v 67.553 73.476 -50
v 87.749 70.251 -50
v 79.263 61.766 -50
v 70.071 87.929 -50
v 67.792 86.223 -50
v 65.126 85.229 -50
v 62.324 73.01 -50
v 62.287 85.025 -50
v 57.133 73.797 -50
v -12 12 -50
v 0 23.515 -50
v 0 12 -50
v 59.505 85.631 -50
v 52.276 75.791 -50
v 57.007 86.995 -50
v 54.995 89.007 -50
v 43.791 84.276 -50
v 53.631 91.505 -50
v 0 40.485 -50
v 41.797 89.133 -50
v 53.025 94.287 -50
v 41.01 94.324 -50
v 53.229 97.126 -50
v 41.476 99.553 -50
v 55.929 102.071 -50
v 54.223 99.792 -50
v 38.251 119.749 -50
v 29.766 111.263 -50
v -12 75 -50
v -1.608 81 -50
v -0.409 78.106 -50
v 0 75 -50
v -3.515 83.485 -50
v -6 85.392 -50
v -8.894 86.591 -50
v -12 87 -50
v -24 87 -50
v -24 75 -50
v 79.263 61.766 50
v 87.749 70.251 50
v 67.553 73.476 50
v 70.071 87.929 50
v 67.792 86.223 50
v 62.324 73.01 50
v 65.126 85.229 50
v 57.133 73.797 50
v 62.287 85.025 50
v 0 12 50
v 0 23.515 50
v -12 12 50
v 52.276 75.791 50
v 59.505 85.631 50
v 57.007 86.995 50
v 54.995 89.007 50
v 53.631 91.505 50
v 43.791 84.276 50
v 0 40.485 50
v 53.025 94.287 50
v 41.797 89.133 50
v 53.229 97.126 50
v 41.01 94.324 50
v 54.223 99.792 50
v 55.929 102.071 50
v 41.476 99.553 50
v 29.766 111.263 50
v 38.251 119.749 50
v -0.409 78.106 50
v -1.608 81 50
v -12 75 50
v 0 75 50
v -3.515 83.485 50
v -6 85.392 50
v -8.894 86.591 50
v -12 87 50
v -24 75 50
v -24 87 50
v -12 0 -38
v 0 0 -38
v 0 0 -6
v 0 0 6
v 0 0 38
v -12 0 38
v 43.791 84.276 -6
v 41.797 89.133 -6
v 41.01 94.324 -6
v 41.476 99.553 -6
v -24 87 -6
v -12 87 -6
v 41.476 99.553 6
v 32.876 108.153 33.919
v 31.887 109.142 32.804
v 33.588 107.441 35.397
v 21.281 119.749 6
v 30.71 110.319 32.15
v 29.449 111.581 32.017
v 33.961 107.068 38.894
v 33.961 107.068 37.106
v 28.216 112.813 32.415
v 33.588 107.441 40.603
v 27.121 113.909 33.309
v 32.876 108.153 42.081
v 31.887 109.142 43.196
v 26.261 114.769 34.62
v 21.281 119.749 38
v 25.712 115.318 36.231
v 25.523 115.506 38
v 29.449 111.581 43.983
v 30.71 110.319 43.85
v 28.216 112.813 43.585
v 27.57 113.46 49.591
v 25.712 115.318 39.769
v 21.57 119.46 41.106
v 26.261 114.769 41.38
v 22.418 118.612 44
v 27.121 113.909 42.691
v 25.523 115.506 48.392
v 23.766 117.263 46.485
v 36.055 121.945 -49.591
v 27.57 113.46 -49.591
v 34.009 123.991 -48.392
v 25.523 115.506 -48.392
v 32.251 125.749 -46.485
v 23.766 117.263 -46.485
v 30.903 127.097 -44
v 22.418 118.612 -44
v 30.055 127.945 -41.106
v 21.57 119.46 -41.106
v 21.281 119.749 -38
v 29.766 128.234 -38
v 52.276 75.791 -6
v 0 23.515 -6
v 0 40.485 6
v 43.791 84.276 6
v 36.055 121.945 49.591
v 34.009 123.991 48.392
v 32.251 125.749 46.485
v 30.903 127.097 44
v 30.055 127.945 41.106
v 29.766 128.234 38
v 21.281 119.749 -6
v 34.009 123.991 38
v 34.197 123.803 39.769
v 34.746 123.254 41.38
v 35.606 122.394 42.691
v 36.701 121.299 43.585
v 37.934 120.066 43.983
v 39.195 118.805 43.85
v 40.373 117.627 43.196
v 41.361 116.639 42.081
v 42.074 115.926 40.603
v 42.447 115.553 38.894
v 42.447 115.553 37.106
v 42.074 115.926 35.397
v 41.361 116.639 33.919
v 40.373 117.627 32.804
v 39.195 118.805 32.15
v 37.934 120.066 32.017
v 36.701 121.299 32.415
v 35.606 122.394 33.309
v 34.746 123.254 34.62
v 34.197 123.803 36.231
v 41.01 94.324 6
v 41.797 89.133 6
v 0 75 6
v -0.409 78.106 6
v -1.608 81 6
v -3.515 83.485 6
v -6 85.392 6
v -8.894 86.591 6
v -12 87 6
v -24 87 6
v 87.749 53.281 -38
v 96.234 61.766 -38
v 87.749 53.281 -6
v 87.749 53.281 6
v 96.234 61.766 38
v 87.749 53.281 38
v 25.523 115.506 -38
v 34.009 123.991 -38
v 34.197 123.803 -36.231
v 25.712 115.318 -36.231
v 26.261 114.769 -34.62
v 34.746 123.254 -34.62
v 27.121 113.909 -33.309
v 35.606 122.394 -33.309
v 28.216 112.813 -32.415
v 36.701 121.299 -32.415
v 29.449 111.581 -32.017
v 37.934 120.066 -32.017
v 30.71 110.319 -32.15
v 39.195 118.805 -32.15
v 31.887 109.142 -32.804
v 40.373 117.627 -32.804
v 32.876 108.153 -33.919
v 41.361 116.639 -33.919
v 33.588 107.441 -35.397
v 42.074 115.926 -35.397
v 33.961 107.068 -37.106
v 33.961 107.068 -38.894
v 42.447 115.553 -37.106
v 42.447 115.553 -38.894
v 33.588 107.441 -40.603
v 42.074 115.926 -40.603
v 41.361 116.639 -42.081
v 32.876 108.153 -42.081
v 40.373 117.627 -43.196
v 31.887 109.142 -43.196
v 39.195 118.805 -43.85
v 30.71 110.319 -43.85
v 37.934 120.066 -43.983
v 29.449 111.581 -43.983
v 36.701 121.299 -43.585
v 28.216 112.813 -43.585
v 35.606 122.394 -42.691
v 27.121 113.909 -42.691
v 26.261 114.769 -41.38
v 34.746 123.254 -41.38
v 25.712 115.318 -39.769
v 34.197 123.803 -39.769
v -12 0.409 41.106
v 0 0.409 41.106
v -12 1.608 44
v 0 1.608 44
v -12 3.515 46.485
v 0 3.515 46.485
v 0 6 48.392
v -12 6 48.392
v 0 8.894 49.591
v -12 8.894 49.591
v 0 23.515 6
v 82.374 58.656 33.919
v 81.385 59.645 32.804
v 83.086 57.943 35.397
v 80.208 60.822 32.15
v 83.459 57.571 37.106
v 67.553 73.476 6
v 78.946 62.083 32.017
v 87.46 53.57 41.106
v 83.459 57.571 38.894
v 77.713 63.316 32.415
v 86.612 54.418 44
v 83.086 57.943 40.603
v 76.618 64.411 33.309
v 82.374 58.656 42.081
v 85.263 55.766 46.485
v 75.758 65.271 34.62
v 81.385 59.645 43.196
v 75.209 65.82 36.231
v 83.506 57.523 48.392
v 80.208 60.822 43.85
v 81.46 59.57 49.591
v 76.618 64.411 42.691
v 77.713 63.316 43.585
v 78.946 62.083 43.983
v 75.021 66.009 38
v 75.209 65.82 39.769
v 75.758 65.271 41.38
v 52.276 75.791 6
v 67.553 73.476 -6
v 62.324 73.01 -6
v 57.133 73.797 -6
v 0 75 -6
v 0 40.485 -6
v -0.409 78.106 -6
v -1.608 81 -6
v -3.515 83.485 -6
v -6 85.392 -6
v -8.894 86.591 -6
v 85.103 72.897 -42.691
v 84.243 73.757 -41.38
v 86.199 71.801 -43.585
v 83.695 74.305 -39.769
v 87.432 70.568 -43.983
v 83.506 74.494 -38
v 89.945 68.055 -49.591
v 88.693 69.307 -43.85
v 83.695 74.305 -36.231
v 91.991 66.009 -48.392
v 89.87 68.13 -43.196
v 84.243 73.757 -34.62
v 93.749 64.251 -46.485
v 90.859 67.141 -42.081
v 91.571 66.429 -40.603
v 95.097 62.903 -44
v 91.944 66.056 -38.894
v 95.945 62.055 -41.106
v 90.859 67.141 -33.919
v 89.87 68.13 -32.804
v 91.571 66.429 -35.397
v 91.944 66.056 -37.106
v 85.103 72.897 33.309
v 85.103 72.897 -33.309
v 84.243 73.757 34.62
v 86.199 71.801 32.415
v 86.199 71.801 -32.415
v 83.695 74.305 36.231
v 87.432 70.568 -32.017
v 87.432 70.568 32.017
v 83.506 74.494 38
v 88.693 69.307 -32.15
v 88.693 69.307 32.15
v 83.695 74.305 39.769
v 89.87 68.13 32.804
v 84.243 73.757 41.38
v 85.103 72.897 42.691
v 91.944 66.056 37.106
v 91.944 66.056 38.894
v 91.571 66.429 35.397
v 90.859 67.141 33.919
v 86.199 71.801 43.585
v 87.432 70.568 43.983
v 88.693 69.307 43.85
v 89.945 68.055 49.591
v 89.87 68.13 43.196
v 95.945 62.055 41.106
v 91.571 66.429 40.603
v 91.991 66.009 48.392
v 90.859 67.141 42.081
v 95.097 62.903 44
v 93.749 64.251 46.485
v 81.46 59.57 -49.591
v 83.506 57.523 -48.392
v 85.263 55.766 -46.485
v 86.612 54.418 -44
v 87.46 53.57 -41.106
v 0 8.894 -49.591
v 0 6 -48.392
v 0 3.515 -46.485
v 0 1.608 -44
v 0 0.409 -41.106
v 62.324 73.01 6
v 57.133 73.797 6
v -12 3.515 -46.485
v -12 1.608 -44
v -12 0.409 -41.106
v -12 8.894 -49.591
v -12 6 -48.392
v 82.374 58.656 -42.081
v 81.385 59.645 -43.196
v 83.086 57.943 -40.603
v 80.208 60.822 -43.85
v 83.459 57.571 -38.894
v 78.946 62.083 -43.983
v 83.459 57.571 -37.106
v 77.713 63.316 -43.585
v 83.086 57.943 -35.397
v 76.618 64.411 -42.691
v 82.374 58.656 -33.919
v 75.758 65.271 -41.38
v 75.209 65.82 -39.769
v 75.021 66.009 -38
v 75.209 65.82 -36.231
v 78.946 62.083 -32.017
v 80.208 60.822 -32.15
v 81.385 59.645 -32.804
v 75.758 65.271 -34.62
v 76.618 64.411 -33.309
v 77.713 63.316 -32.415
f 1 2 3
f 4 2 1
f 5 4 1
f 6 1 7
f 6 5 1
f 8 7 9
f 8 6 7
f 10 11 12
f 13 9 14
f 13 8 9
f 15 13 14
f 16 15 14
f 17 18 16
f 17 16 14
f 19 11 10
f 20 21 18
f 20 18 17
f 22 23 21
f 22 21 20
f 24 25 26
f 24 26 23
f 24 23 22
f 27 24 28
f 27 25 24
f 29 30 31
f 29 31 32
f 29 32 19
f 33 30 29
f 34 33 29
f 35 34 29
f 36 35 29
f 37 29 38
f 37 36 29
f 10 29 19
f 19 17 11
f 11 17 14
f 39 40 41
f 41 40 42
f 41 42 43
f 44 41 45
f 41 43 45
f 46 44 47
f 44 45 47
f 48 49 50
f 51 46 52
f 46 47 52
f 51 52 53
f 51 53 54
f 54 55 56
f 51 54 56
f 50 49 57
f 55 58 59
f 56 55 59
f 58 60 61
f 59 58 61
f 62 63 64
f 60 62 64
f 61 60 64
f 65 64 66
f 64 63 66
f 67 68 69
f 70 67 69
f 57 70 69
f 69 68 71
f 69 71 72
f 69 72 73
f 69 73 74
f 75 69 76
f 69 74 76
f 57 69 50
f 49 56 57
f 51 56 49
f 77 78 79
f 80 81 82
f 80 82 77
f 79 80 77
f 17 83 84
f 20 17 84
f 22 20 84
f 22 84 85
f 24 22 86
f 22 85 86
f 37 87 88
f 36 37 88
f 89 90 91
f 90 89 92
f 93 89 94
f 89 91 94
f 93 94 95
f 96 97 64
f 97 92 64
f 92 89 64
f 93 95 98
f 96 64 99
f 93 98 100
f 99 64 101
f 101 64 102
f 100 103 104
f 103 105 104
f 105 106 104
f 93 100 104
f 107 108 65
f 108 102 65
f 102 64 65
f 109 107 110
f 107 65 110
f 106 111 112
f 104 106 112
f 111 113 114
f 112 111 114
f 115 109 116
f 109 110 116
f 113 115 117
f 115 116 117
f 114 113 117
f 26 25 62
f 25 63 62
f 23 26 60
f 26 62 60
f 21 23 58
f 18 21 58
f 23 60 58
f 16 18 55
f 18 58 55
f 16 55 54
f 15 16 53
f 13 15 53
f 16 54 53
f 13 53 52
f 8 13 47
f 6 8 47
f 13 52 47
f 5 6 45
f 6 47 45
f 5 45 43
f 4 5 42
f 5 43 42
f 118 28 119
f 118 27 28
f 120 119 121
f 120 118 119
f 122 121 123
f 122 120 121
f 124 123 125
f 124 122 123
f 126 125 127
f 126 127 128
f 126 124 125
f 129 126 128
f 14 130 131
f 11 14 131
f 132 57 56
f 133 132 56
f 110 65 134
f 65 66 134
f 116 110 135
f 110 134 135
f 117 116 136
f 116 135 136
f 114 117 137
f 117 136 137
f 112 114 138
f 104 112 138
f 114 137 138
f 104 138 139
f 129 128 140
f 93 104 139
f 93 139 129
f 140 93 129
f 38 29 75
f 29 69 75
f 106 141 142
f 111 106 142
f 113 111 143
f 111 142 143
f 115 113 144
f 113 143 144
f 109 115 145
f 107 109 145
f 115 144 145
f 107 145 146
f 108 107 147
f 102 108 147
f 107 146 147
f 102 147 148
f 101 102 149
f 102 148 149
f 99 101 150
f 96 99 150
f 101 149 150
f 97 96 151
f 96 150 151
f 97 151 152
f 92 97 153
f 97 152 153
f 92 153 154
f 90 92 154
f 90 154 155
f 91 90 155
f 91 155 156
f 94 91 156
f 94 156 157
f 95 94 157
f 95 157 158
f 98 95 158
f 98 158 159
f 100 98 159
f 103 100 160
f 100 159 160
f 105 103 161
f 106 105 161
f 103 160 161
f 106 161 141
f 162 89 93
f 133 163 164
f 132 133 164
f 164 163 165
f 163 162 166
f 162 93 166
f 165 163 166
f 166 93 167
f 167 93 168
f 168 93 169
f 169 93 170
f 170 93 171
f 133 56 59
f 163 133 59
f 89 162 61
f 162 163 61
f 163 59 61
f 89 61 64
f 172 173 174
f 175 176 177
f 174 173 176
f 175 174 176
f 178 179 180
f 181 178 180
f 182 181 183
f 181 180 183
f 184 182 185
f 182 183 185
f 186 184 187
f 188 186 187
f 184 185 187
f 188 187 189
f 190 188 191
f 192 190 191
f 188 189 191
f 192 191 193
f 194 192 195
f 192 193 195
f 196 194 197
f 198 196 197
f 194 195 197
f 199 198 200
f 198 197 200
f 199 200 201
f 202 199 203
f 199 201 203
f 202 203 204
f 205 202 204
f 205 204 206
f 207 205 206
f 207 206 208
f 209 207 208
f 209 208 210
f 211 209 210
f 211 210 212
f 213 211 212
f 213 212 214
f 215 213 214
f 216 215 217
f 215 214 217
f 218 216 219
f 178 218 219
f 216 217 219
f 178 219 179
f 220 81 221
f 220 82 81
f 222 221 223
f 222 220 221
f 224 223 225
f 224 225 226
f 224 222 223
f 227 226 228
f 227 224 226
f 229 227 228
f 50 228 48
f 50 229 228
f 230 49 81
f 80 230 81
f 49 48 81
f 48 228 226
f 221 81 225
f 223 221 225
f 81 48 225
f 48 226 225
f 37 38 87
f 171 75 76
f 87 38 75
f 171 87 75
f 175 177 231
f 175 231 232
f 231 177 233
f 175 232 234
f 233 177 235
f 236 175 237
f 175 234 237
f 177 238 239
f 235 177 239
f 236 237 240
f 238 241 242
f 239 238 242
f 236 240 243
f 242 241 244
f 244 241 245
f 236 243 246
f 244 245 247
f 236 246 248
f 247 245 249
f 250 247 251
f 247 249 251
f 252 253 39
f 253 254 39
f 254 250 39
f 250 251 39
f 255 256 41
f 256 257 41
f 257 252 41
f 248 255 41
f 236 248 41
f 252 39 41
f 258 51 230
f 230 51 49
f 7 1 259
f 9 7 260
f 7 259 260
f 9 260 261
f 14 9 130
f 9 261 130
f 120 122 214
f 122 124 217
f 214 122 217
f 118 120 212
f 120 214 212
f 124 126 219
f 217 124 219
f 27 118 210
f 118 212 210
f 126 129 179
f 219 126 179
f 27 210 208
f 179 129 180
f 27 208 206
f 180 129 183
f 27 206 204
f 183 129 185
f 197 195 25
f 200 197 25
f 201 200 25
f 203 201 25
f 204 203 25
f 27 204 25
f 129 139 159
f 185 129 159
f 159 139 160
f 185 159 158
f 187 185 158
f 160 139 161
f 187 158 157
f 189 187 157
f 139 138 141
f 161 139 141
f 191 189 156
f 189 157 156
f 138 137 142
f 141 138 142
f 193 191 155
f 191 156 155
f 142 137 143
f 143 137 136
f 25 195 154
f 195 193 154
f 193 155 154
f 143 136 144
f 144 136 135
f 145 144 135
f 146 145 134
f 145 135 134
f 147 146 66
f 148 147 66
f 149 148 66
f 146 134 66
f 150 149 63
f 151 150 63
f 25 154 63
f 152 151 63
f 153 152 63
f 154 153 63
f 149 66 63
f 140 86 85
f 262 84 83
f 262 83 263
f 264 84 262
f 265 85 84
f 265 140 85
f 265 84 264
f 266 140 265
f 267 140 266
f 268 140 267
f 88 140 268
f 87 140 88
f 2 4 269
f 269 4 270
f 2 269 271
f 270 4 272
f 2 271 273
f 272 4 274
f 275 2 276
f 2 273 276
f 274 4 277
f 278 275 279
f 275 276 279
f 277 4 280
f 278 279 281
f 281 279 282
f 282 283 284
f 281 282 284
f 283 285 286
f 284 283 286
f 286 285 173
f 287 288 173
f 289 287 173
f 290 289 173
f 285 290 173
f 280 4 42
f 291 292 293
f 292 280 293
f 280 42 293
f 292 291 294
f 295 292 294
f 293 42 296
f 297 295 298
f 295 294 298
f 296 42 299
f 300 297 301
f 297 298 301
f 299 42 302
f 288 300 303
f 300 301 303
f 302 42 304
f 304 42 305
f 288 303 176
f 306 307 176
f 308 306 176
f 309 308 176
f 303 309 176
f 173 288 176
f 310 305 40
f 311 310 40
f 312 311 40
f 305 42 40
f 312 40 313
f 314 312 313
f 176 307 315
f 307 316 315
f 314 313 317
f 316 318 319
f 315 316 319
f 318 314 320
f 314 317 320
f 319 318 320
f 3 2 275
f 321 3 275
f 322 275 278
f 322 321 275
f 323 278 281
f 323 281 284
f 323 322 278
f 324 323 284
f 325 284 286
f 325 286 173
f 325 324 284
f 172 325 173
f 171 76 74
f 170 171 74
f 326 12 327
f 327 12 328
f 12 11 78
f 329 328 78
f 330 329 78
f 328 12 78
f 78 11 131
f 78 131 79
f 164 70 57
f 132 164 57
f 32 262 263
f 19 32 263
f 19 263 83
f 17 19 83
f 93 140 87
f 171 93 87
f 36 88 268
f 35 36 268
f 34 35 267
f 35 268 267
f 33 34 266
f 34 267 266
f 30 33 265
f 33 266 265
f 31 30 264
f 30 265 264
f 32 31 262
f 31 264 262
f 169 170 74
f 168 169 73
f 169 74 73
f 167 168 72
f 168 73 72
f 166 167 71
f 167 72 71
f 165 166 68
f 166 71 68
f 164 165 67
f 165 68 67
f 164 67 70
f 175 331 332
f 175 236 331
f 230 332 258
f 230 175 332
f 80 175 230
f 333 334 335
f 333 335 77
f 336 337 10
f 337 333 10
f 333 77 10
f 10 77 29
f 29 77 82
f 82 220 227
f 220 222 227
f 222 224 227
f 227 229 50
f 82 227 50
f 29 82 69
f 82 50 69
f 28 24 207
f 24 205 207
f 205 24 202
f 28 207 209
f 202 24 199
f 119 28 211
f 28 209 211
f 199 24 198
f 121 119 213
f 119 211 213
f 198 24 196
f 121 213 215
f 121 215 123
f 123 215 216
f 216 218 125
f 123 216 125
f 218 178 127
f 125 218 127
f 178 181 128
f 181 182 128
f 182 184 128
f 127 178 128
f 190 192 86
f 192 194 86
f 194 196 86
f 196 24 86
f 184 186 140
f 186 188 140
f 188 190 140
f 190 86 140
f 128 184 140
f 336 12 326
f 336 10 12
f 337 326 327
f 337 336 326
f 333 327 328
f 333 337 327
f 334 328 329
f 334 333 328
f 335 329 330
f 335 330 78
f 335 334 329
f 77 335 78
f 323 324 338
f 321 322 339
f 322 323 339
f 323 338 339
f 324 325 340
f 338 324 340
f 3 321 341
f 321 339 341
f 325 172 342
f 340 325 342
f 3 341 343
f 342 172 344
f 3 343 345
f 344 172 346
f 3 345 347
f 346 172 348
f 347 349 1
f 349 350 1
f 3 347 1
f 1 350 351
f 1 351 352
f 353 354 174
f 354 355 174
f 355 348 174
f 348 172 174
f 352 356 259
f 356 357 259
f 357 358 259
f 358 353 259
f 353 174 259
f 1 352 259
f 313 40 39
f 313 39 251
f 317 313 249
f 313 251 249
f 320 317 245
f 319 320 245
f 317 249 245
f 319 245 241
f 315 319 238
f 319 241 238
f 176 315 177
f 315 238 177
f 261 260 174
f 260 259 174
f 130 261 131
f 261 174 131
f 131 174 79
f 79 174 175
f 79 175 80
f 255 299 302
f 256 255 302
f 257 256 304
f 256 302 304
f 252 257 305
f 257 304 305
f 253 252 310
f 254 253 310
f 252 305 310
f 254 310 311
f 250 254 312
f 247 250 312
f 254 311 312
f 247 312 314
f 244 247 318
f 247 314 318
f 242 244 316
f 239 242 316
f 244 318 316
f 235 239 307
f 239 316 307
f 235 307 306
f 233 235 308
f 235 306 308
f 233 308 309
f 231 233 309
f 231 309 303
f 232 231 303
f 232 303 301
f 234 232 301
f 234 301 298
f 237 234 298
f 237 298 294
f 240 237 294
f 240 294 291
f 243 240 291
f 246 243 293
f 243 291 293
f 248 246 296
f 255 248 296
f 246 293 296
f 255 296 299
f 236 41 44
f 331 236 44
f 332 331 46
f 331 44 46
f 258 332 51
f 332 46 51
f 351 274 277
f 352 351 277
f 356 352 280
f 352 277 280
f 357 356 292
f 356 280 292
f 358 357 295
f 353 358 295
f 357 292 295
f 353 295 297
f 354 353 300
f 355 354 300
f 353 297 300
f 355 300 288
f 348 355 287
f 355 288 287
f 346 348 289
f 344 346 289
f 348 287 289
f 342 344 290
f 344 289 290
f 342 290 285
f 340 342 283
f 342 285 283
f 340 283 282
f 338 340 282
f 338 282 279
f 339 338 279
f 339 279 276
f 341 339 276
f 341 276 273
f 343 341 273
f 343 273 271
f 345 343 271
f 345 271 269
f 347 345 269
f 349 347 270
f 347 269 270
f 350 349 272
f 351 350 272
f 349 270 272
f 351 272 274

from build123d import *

# Parameters (mm, degrees)
BOSS_EXTRUDE1_DEPTH = 50
SKETCH2_R           = 6
CUT_EXTRUDE1_DEPTH  = 12
FILLET1_R           = 12
FILLET2_R           = 12
RIB3_REACH          = 169.943
SKETCH14_WALL_W     = 393.768799168
SKETCH14_WALL_H     = 12
RIB5_REACH          = 169.943
SKETCH15_WALL_W     = 440.544630956
SKETCH15_WALL_H     = 12


with BuildPart() as part:
    # Sketch1 → Boss-Extrude1 (new, symmetric)
    with BuildSketch(Plane.XY):
        with BuildLine():
            Line((0, 0), (-12, 0))
            Line((-12, 0), (-12, 75))
            Line((-12, 75), (-24, 75))
            Line((-24, 75), (-24, 87))
            Line((-24, 87), (-12, 87))
            ThreePointArc((-12, 87), (-3.514718626, 83.485281374), (0, 75))
            Line((0, 75), (0, 40.485281374))
            Line((0, 40.485281374), (43.790729766, 84.27601114))
            ThreePointArc((43.790729766, 84.27601114), (41.248196059, 91.704696476), (41.476313815, 99.553123436))
            Line((41.476313815, 99.553123436), (21.28069991, 119.748737342))
            Line((21.28069991, 119.748737342), (29.765981284, 128.234018716))
            Line((29.765981284, 128.234018716), (55.928932188, 102.071067812))
            ThreePointArc((55.928932188, 102.071067812), (55.928932188, 87.928932188), (70.071067812, 87.928932188))
            Line((70.071067812, 87.928932188), (96.234018716, 61.765981284))
            Line((96.234018716, 61.765981284), (87.748737342, 53.28069991))
            Line((87.748737342, 53.28069991), (67.553123436, 73.476313815))
            ThreePointArc((67.553123436, 73.476313815), (59.704696476, 73.248196059), (52.27601114, 75.790729766))
            Line((52.27601114, 75.790729766), (0, 23.514718626))
            Line((0, 23.514718626), (0, 0))
        make_face()
    extrude(amount=BOSS_EXTRUDE1_DEPTH, both=True)

    # Sketch2 → Cut-Extrude1 (cut)
    with BuildSketch(Plane(origin=(79, 79, 0), x_dir=(0, 0, -1), z_dir=(0.7071067811865508, 0.7071067811865444, 0))):
        with Locations(Location((-38, 57.627416998, 0), (0, 0, 90))):
            Circle(SKETCH2_R)
        with Locations(Location((38, 57.627416998, 0), (0, 0, 90))):
            Circle(SKETCH2_R)
        with Locations(Location((38, -12.372583002, 0), (0, 0, 90))):
            Circle(SKETCH2_R)
        with Locations(Location((-38, -12.372583002, 0), (0, 0, 90))):
            Circle(SKETCH2_R)
    extrude(amount=-CUT_EXTRUDE1_DEPTH, mode=Mode.SUBTRACT)

    # Fillet1
    fillet1_edges = [part.edges().sort_by_distance(p)[0] for p in [
        (91.991378029, 57.523340597, 50),
        (25.523340597, 123.991378029, -50),
        (91.991378029, 57.523340597, -50),
        (25.523340597, 123.991378029, 50),
    ]]
    fillet(fillet1_edges, radius=FILLET1_R)

    # Fillet2
    fillet2_edges = [part.edges().sort_by_distance(p)[0] for p in [
        (-6, 0, -50),
        (-6, 0, 50),
    ]]
    fillet(fillet2_edges, radius=FILLET2_R)

    # Sketch14 wall → Rib3 (add, up to next)
    with BuildSketch(Plane(origin=(-1.359650045, 103.374368671, 0), x_dir=(-0.810288257242, -0.586031518074, 0), z_dir=(0.586031518074, -0.810288257242, 0)), mode=Mode.PRIVATE) as rib3_sk1:
        Rectangle(SKETCH14_WALL_W, SKETCH14_WALL_H)
    rib3_tool1 = extrude(rib3_sk1.sketch, amount=RIB3_REACH, mode=Mode.PRIVATE) - part.part
    add(rib3_tool1.solids().sort_by_distance((-1.359650045, 103.374368671, 0))[0])

    # Sketch15 wall → Rib5 (add, up to next)
    with BuildSketch(Plane(origin=(43.874368671, 26.640349955, 0), x_dir=(-0.854767287398, -0.519011449193, 0), z_dir=(0.519011449193, -0.854767287398, 0)), mode=Mode.PRIVATE) as rib5_sk1:
        Rectangle(SKETCH15_WALL_W, SKETCH15_WALL_H)
    rib5_tool1 = extrude(rib5_sk1.sketch, amount=-RIB5_REACH, mode=Mode.PRIVATE) - part.part
    add(rib5_tool1.solids().sort_by_distance((43.874368671, 26.640349955, 0))[0])


solid = part.part
